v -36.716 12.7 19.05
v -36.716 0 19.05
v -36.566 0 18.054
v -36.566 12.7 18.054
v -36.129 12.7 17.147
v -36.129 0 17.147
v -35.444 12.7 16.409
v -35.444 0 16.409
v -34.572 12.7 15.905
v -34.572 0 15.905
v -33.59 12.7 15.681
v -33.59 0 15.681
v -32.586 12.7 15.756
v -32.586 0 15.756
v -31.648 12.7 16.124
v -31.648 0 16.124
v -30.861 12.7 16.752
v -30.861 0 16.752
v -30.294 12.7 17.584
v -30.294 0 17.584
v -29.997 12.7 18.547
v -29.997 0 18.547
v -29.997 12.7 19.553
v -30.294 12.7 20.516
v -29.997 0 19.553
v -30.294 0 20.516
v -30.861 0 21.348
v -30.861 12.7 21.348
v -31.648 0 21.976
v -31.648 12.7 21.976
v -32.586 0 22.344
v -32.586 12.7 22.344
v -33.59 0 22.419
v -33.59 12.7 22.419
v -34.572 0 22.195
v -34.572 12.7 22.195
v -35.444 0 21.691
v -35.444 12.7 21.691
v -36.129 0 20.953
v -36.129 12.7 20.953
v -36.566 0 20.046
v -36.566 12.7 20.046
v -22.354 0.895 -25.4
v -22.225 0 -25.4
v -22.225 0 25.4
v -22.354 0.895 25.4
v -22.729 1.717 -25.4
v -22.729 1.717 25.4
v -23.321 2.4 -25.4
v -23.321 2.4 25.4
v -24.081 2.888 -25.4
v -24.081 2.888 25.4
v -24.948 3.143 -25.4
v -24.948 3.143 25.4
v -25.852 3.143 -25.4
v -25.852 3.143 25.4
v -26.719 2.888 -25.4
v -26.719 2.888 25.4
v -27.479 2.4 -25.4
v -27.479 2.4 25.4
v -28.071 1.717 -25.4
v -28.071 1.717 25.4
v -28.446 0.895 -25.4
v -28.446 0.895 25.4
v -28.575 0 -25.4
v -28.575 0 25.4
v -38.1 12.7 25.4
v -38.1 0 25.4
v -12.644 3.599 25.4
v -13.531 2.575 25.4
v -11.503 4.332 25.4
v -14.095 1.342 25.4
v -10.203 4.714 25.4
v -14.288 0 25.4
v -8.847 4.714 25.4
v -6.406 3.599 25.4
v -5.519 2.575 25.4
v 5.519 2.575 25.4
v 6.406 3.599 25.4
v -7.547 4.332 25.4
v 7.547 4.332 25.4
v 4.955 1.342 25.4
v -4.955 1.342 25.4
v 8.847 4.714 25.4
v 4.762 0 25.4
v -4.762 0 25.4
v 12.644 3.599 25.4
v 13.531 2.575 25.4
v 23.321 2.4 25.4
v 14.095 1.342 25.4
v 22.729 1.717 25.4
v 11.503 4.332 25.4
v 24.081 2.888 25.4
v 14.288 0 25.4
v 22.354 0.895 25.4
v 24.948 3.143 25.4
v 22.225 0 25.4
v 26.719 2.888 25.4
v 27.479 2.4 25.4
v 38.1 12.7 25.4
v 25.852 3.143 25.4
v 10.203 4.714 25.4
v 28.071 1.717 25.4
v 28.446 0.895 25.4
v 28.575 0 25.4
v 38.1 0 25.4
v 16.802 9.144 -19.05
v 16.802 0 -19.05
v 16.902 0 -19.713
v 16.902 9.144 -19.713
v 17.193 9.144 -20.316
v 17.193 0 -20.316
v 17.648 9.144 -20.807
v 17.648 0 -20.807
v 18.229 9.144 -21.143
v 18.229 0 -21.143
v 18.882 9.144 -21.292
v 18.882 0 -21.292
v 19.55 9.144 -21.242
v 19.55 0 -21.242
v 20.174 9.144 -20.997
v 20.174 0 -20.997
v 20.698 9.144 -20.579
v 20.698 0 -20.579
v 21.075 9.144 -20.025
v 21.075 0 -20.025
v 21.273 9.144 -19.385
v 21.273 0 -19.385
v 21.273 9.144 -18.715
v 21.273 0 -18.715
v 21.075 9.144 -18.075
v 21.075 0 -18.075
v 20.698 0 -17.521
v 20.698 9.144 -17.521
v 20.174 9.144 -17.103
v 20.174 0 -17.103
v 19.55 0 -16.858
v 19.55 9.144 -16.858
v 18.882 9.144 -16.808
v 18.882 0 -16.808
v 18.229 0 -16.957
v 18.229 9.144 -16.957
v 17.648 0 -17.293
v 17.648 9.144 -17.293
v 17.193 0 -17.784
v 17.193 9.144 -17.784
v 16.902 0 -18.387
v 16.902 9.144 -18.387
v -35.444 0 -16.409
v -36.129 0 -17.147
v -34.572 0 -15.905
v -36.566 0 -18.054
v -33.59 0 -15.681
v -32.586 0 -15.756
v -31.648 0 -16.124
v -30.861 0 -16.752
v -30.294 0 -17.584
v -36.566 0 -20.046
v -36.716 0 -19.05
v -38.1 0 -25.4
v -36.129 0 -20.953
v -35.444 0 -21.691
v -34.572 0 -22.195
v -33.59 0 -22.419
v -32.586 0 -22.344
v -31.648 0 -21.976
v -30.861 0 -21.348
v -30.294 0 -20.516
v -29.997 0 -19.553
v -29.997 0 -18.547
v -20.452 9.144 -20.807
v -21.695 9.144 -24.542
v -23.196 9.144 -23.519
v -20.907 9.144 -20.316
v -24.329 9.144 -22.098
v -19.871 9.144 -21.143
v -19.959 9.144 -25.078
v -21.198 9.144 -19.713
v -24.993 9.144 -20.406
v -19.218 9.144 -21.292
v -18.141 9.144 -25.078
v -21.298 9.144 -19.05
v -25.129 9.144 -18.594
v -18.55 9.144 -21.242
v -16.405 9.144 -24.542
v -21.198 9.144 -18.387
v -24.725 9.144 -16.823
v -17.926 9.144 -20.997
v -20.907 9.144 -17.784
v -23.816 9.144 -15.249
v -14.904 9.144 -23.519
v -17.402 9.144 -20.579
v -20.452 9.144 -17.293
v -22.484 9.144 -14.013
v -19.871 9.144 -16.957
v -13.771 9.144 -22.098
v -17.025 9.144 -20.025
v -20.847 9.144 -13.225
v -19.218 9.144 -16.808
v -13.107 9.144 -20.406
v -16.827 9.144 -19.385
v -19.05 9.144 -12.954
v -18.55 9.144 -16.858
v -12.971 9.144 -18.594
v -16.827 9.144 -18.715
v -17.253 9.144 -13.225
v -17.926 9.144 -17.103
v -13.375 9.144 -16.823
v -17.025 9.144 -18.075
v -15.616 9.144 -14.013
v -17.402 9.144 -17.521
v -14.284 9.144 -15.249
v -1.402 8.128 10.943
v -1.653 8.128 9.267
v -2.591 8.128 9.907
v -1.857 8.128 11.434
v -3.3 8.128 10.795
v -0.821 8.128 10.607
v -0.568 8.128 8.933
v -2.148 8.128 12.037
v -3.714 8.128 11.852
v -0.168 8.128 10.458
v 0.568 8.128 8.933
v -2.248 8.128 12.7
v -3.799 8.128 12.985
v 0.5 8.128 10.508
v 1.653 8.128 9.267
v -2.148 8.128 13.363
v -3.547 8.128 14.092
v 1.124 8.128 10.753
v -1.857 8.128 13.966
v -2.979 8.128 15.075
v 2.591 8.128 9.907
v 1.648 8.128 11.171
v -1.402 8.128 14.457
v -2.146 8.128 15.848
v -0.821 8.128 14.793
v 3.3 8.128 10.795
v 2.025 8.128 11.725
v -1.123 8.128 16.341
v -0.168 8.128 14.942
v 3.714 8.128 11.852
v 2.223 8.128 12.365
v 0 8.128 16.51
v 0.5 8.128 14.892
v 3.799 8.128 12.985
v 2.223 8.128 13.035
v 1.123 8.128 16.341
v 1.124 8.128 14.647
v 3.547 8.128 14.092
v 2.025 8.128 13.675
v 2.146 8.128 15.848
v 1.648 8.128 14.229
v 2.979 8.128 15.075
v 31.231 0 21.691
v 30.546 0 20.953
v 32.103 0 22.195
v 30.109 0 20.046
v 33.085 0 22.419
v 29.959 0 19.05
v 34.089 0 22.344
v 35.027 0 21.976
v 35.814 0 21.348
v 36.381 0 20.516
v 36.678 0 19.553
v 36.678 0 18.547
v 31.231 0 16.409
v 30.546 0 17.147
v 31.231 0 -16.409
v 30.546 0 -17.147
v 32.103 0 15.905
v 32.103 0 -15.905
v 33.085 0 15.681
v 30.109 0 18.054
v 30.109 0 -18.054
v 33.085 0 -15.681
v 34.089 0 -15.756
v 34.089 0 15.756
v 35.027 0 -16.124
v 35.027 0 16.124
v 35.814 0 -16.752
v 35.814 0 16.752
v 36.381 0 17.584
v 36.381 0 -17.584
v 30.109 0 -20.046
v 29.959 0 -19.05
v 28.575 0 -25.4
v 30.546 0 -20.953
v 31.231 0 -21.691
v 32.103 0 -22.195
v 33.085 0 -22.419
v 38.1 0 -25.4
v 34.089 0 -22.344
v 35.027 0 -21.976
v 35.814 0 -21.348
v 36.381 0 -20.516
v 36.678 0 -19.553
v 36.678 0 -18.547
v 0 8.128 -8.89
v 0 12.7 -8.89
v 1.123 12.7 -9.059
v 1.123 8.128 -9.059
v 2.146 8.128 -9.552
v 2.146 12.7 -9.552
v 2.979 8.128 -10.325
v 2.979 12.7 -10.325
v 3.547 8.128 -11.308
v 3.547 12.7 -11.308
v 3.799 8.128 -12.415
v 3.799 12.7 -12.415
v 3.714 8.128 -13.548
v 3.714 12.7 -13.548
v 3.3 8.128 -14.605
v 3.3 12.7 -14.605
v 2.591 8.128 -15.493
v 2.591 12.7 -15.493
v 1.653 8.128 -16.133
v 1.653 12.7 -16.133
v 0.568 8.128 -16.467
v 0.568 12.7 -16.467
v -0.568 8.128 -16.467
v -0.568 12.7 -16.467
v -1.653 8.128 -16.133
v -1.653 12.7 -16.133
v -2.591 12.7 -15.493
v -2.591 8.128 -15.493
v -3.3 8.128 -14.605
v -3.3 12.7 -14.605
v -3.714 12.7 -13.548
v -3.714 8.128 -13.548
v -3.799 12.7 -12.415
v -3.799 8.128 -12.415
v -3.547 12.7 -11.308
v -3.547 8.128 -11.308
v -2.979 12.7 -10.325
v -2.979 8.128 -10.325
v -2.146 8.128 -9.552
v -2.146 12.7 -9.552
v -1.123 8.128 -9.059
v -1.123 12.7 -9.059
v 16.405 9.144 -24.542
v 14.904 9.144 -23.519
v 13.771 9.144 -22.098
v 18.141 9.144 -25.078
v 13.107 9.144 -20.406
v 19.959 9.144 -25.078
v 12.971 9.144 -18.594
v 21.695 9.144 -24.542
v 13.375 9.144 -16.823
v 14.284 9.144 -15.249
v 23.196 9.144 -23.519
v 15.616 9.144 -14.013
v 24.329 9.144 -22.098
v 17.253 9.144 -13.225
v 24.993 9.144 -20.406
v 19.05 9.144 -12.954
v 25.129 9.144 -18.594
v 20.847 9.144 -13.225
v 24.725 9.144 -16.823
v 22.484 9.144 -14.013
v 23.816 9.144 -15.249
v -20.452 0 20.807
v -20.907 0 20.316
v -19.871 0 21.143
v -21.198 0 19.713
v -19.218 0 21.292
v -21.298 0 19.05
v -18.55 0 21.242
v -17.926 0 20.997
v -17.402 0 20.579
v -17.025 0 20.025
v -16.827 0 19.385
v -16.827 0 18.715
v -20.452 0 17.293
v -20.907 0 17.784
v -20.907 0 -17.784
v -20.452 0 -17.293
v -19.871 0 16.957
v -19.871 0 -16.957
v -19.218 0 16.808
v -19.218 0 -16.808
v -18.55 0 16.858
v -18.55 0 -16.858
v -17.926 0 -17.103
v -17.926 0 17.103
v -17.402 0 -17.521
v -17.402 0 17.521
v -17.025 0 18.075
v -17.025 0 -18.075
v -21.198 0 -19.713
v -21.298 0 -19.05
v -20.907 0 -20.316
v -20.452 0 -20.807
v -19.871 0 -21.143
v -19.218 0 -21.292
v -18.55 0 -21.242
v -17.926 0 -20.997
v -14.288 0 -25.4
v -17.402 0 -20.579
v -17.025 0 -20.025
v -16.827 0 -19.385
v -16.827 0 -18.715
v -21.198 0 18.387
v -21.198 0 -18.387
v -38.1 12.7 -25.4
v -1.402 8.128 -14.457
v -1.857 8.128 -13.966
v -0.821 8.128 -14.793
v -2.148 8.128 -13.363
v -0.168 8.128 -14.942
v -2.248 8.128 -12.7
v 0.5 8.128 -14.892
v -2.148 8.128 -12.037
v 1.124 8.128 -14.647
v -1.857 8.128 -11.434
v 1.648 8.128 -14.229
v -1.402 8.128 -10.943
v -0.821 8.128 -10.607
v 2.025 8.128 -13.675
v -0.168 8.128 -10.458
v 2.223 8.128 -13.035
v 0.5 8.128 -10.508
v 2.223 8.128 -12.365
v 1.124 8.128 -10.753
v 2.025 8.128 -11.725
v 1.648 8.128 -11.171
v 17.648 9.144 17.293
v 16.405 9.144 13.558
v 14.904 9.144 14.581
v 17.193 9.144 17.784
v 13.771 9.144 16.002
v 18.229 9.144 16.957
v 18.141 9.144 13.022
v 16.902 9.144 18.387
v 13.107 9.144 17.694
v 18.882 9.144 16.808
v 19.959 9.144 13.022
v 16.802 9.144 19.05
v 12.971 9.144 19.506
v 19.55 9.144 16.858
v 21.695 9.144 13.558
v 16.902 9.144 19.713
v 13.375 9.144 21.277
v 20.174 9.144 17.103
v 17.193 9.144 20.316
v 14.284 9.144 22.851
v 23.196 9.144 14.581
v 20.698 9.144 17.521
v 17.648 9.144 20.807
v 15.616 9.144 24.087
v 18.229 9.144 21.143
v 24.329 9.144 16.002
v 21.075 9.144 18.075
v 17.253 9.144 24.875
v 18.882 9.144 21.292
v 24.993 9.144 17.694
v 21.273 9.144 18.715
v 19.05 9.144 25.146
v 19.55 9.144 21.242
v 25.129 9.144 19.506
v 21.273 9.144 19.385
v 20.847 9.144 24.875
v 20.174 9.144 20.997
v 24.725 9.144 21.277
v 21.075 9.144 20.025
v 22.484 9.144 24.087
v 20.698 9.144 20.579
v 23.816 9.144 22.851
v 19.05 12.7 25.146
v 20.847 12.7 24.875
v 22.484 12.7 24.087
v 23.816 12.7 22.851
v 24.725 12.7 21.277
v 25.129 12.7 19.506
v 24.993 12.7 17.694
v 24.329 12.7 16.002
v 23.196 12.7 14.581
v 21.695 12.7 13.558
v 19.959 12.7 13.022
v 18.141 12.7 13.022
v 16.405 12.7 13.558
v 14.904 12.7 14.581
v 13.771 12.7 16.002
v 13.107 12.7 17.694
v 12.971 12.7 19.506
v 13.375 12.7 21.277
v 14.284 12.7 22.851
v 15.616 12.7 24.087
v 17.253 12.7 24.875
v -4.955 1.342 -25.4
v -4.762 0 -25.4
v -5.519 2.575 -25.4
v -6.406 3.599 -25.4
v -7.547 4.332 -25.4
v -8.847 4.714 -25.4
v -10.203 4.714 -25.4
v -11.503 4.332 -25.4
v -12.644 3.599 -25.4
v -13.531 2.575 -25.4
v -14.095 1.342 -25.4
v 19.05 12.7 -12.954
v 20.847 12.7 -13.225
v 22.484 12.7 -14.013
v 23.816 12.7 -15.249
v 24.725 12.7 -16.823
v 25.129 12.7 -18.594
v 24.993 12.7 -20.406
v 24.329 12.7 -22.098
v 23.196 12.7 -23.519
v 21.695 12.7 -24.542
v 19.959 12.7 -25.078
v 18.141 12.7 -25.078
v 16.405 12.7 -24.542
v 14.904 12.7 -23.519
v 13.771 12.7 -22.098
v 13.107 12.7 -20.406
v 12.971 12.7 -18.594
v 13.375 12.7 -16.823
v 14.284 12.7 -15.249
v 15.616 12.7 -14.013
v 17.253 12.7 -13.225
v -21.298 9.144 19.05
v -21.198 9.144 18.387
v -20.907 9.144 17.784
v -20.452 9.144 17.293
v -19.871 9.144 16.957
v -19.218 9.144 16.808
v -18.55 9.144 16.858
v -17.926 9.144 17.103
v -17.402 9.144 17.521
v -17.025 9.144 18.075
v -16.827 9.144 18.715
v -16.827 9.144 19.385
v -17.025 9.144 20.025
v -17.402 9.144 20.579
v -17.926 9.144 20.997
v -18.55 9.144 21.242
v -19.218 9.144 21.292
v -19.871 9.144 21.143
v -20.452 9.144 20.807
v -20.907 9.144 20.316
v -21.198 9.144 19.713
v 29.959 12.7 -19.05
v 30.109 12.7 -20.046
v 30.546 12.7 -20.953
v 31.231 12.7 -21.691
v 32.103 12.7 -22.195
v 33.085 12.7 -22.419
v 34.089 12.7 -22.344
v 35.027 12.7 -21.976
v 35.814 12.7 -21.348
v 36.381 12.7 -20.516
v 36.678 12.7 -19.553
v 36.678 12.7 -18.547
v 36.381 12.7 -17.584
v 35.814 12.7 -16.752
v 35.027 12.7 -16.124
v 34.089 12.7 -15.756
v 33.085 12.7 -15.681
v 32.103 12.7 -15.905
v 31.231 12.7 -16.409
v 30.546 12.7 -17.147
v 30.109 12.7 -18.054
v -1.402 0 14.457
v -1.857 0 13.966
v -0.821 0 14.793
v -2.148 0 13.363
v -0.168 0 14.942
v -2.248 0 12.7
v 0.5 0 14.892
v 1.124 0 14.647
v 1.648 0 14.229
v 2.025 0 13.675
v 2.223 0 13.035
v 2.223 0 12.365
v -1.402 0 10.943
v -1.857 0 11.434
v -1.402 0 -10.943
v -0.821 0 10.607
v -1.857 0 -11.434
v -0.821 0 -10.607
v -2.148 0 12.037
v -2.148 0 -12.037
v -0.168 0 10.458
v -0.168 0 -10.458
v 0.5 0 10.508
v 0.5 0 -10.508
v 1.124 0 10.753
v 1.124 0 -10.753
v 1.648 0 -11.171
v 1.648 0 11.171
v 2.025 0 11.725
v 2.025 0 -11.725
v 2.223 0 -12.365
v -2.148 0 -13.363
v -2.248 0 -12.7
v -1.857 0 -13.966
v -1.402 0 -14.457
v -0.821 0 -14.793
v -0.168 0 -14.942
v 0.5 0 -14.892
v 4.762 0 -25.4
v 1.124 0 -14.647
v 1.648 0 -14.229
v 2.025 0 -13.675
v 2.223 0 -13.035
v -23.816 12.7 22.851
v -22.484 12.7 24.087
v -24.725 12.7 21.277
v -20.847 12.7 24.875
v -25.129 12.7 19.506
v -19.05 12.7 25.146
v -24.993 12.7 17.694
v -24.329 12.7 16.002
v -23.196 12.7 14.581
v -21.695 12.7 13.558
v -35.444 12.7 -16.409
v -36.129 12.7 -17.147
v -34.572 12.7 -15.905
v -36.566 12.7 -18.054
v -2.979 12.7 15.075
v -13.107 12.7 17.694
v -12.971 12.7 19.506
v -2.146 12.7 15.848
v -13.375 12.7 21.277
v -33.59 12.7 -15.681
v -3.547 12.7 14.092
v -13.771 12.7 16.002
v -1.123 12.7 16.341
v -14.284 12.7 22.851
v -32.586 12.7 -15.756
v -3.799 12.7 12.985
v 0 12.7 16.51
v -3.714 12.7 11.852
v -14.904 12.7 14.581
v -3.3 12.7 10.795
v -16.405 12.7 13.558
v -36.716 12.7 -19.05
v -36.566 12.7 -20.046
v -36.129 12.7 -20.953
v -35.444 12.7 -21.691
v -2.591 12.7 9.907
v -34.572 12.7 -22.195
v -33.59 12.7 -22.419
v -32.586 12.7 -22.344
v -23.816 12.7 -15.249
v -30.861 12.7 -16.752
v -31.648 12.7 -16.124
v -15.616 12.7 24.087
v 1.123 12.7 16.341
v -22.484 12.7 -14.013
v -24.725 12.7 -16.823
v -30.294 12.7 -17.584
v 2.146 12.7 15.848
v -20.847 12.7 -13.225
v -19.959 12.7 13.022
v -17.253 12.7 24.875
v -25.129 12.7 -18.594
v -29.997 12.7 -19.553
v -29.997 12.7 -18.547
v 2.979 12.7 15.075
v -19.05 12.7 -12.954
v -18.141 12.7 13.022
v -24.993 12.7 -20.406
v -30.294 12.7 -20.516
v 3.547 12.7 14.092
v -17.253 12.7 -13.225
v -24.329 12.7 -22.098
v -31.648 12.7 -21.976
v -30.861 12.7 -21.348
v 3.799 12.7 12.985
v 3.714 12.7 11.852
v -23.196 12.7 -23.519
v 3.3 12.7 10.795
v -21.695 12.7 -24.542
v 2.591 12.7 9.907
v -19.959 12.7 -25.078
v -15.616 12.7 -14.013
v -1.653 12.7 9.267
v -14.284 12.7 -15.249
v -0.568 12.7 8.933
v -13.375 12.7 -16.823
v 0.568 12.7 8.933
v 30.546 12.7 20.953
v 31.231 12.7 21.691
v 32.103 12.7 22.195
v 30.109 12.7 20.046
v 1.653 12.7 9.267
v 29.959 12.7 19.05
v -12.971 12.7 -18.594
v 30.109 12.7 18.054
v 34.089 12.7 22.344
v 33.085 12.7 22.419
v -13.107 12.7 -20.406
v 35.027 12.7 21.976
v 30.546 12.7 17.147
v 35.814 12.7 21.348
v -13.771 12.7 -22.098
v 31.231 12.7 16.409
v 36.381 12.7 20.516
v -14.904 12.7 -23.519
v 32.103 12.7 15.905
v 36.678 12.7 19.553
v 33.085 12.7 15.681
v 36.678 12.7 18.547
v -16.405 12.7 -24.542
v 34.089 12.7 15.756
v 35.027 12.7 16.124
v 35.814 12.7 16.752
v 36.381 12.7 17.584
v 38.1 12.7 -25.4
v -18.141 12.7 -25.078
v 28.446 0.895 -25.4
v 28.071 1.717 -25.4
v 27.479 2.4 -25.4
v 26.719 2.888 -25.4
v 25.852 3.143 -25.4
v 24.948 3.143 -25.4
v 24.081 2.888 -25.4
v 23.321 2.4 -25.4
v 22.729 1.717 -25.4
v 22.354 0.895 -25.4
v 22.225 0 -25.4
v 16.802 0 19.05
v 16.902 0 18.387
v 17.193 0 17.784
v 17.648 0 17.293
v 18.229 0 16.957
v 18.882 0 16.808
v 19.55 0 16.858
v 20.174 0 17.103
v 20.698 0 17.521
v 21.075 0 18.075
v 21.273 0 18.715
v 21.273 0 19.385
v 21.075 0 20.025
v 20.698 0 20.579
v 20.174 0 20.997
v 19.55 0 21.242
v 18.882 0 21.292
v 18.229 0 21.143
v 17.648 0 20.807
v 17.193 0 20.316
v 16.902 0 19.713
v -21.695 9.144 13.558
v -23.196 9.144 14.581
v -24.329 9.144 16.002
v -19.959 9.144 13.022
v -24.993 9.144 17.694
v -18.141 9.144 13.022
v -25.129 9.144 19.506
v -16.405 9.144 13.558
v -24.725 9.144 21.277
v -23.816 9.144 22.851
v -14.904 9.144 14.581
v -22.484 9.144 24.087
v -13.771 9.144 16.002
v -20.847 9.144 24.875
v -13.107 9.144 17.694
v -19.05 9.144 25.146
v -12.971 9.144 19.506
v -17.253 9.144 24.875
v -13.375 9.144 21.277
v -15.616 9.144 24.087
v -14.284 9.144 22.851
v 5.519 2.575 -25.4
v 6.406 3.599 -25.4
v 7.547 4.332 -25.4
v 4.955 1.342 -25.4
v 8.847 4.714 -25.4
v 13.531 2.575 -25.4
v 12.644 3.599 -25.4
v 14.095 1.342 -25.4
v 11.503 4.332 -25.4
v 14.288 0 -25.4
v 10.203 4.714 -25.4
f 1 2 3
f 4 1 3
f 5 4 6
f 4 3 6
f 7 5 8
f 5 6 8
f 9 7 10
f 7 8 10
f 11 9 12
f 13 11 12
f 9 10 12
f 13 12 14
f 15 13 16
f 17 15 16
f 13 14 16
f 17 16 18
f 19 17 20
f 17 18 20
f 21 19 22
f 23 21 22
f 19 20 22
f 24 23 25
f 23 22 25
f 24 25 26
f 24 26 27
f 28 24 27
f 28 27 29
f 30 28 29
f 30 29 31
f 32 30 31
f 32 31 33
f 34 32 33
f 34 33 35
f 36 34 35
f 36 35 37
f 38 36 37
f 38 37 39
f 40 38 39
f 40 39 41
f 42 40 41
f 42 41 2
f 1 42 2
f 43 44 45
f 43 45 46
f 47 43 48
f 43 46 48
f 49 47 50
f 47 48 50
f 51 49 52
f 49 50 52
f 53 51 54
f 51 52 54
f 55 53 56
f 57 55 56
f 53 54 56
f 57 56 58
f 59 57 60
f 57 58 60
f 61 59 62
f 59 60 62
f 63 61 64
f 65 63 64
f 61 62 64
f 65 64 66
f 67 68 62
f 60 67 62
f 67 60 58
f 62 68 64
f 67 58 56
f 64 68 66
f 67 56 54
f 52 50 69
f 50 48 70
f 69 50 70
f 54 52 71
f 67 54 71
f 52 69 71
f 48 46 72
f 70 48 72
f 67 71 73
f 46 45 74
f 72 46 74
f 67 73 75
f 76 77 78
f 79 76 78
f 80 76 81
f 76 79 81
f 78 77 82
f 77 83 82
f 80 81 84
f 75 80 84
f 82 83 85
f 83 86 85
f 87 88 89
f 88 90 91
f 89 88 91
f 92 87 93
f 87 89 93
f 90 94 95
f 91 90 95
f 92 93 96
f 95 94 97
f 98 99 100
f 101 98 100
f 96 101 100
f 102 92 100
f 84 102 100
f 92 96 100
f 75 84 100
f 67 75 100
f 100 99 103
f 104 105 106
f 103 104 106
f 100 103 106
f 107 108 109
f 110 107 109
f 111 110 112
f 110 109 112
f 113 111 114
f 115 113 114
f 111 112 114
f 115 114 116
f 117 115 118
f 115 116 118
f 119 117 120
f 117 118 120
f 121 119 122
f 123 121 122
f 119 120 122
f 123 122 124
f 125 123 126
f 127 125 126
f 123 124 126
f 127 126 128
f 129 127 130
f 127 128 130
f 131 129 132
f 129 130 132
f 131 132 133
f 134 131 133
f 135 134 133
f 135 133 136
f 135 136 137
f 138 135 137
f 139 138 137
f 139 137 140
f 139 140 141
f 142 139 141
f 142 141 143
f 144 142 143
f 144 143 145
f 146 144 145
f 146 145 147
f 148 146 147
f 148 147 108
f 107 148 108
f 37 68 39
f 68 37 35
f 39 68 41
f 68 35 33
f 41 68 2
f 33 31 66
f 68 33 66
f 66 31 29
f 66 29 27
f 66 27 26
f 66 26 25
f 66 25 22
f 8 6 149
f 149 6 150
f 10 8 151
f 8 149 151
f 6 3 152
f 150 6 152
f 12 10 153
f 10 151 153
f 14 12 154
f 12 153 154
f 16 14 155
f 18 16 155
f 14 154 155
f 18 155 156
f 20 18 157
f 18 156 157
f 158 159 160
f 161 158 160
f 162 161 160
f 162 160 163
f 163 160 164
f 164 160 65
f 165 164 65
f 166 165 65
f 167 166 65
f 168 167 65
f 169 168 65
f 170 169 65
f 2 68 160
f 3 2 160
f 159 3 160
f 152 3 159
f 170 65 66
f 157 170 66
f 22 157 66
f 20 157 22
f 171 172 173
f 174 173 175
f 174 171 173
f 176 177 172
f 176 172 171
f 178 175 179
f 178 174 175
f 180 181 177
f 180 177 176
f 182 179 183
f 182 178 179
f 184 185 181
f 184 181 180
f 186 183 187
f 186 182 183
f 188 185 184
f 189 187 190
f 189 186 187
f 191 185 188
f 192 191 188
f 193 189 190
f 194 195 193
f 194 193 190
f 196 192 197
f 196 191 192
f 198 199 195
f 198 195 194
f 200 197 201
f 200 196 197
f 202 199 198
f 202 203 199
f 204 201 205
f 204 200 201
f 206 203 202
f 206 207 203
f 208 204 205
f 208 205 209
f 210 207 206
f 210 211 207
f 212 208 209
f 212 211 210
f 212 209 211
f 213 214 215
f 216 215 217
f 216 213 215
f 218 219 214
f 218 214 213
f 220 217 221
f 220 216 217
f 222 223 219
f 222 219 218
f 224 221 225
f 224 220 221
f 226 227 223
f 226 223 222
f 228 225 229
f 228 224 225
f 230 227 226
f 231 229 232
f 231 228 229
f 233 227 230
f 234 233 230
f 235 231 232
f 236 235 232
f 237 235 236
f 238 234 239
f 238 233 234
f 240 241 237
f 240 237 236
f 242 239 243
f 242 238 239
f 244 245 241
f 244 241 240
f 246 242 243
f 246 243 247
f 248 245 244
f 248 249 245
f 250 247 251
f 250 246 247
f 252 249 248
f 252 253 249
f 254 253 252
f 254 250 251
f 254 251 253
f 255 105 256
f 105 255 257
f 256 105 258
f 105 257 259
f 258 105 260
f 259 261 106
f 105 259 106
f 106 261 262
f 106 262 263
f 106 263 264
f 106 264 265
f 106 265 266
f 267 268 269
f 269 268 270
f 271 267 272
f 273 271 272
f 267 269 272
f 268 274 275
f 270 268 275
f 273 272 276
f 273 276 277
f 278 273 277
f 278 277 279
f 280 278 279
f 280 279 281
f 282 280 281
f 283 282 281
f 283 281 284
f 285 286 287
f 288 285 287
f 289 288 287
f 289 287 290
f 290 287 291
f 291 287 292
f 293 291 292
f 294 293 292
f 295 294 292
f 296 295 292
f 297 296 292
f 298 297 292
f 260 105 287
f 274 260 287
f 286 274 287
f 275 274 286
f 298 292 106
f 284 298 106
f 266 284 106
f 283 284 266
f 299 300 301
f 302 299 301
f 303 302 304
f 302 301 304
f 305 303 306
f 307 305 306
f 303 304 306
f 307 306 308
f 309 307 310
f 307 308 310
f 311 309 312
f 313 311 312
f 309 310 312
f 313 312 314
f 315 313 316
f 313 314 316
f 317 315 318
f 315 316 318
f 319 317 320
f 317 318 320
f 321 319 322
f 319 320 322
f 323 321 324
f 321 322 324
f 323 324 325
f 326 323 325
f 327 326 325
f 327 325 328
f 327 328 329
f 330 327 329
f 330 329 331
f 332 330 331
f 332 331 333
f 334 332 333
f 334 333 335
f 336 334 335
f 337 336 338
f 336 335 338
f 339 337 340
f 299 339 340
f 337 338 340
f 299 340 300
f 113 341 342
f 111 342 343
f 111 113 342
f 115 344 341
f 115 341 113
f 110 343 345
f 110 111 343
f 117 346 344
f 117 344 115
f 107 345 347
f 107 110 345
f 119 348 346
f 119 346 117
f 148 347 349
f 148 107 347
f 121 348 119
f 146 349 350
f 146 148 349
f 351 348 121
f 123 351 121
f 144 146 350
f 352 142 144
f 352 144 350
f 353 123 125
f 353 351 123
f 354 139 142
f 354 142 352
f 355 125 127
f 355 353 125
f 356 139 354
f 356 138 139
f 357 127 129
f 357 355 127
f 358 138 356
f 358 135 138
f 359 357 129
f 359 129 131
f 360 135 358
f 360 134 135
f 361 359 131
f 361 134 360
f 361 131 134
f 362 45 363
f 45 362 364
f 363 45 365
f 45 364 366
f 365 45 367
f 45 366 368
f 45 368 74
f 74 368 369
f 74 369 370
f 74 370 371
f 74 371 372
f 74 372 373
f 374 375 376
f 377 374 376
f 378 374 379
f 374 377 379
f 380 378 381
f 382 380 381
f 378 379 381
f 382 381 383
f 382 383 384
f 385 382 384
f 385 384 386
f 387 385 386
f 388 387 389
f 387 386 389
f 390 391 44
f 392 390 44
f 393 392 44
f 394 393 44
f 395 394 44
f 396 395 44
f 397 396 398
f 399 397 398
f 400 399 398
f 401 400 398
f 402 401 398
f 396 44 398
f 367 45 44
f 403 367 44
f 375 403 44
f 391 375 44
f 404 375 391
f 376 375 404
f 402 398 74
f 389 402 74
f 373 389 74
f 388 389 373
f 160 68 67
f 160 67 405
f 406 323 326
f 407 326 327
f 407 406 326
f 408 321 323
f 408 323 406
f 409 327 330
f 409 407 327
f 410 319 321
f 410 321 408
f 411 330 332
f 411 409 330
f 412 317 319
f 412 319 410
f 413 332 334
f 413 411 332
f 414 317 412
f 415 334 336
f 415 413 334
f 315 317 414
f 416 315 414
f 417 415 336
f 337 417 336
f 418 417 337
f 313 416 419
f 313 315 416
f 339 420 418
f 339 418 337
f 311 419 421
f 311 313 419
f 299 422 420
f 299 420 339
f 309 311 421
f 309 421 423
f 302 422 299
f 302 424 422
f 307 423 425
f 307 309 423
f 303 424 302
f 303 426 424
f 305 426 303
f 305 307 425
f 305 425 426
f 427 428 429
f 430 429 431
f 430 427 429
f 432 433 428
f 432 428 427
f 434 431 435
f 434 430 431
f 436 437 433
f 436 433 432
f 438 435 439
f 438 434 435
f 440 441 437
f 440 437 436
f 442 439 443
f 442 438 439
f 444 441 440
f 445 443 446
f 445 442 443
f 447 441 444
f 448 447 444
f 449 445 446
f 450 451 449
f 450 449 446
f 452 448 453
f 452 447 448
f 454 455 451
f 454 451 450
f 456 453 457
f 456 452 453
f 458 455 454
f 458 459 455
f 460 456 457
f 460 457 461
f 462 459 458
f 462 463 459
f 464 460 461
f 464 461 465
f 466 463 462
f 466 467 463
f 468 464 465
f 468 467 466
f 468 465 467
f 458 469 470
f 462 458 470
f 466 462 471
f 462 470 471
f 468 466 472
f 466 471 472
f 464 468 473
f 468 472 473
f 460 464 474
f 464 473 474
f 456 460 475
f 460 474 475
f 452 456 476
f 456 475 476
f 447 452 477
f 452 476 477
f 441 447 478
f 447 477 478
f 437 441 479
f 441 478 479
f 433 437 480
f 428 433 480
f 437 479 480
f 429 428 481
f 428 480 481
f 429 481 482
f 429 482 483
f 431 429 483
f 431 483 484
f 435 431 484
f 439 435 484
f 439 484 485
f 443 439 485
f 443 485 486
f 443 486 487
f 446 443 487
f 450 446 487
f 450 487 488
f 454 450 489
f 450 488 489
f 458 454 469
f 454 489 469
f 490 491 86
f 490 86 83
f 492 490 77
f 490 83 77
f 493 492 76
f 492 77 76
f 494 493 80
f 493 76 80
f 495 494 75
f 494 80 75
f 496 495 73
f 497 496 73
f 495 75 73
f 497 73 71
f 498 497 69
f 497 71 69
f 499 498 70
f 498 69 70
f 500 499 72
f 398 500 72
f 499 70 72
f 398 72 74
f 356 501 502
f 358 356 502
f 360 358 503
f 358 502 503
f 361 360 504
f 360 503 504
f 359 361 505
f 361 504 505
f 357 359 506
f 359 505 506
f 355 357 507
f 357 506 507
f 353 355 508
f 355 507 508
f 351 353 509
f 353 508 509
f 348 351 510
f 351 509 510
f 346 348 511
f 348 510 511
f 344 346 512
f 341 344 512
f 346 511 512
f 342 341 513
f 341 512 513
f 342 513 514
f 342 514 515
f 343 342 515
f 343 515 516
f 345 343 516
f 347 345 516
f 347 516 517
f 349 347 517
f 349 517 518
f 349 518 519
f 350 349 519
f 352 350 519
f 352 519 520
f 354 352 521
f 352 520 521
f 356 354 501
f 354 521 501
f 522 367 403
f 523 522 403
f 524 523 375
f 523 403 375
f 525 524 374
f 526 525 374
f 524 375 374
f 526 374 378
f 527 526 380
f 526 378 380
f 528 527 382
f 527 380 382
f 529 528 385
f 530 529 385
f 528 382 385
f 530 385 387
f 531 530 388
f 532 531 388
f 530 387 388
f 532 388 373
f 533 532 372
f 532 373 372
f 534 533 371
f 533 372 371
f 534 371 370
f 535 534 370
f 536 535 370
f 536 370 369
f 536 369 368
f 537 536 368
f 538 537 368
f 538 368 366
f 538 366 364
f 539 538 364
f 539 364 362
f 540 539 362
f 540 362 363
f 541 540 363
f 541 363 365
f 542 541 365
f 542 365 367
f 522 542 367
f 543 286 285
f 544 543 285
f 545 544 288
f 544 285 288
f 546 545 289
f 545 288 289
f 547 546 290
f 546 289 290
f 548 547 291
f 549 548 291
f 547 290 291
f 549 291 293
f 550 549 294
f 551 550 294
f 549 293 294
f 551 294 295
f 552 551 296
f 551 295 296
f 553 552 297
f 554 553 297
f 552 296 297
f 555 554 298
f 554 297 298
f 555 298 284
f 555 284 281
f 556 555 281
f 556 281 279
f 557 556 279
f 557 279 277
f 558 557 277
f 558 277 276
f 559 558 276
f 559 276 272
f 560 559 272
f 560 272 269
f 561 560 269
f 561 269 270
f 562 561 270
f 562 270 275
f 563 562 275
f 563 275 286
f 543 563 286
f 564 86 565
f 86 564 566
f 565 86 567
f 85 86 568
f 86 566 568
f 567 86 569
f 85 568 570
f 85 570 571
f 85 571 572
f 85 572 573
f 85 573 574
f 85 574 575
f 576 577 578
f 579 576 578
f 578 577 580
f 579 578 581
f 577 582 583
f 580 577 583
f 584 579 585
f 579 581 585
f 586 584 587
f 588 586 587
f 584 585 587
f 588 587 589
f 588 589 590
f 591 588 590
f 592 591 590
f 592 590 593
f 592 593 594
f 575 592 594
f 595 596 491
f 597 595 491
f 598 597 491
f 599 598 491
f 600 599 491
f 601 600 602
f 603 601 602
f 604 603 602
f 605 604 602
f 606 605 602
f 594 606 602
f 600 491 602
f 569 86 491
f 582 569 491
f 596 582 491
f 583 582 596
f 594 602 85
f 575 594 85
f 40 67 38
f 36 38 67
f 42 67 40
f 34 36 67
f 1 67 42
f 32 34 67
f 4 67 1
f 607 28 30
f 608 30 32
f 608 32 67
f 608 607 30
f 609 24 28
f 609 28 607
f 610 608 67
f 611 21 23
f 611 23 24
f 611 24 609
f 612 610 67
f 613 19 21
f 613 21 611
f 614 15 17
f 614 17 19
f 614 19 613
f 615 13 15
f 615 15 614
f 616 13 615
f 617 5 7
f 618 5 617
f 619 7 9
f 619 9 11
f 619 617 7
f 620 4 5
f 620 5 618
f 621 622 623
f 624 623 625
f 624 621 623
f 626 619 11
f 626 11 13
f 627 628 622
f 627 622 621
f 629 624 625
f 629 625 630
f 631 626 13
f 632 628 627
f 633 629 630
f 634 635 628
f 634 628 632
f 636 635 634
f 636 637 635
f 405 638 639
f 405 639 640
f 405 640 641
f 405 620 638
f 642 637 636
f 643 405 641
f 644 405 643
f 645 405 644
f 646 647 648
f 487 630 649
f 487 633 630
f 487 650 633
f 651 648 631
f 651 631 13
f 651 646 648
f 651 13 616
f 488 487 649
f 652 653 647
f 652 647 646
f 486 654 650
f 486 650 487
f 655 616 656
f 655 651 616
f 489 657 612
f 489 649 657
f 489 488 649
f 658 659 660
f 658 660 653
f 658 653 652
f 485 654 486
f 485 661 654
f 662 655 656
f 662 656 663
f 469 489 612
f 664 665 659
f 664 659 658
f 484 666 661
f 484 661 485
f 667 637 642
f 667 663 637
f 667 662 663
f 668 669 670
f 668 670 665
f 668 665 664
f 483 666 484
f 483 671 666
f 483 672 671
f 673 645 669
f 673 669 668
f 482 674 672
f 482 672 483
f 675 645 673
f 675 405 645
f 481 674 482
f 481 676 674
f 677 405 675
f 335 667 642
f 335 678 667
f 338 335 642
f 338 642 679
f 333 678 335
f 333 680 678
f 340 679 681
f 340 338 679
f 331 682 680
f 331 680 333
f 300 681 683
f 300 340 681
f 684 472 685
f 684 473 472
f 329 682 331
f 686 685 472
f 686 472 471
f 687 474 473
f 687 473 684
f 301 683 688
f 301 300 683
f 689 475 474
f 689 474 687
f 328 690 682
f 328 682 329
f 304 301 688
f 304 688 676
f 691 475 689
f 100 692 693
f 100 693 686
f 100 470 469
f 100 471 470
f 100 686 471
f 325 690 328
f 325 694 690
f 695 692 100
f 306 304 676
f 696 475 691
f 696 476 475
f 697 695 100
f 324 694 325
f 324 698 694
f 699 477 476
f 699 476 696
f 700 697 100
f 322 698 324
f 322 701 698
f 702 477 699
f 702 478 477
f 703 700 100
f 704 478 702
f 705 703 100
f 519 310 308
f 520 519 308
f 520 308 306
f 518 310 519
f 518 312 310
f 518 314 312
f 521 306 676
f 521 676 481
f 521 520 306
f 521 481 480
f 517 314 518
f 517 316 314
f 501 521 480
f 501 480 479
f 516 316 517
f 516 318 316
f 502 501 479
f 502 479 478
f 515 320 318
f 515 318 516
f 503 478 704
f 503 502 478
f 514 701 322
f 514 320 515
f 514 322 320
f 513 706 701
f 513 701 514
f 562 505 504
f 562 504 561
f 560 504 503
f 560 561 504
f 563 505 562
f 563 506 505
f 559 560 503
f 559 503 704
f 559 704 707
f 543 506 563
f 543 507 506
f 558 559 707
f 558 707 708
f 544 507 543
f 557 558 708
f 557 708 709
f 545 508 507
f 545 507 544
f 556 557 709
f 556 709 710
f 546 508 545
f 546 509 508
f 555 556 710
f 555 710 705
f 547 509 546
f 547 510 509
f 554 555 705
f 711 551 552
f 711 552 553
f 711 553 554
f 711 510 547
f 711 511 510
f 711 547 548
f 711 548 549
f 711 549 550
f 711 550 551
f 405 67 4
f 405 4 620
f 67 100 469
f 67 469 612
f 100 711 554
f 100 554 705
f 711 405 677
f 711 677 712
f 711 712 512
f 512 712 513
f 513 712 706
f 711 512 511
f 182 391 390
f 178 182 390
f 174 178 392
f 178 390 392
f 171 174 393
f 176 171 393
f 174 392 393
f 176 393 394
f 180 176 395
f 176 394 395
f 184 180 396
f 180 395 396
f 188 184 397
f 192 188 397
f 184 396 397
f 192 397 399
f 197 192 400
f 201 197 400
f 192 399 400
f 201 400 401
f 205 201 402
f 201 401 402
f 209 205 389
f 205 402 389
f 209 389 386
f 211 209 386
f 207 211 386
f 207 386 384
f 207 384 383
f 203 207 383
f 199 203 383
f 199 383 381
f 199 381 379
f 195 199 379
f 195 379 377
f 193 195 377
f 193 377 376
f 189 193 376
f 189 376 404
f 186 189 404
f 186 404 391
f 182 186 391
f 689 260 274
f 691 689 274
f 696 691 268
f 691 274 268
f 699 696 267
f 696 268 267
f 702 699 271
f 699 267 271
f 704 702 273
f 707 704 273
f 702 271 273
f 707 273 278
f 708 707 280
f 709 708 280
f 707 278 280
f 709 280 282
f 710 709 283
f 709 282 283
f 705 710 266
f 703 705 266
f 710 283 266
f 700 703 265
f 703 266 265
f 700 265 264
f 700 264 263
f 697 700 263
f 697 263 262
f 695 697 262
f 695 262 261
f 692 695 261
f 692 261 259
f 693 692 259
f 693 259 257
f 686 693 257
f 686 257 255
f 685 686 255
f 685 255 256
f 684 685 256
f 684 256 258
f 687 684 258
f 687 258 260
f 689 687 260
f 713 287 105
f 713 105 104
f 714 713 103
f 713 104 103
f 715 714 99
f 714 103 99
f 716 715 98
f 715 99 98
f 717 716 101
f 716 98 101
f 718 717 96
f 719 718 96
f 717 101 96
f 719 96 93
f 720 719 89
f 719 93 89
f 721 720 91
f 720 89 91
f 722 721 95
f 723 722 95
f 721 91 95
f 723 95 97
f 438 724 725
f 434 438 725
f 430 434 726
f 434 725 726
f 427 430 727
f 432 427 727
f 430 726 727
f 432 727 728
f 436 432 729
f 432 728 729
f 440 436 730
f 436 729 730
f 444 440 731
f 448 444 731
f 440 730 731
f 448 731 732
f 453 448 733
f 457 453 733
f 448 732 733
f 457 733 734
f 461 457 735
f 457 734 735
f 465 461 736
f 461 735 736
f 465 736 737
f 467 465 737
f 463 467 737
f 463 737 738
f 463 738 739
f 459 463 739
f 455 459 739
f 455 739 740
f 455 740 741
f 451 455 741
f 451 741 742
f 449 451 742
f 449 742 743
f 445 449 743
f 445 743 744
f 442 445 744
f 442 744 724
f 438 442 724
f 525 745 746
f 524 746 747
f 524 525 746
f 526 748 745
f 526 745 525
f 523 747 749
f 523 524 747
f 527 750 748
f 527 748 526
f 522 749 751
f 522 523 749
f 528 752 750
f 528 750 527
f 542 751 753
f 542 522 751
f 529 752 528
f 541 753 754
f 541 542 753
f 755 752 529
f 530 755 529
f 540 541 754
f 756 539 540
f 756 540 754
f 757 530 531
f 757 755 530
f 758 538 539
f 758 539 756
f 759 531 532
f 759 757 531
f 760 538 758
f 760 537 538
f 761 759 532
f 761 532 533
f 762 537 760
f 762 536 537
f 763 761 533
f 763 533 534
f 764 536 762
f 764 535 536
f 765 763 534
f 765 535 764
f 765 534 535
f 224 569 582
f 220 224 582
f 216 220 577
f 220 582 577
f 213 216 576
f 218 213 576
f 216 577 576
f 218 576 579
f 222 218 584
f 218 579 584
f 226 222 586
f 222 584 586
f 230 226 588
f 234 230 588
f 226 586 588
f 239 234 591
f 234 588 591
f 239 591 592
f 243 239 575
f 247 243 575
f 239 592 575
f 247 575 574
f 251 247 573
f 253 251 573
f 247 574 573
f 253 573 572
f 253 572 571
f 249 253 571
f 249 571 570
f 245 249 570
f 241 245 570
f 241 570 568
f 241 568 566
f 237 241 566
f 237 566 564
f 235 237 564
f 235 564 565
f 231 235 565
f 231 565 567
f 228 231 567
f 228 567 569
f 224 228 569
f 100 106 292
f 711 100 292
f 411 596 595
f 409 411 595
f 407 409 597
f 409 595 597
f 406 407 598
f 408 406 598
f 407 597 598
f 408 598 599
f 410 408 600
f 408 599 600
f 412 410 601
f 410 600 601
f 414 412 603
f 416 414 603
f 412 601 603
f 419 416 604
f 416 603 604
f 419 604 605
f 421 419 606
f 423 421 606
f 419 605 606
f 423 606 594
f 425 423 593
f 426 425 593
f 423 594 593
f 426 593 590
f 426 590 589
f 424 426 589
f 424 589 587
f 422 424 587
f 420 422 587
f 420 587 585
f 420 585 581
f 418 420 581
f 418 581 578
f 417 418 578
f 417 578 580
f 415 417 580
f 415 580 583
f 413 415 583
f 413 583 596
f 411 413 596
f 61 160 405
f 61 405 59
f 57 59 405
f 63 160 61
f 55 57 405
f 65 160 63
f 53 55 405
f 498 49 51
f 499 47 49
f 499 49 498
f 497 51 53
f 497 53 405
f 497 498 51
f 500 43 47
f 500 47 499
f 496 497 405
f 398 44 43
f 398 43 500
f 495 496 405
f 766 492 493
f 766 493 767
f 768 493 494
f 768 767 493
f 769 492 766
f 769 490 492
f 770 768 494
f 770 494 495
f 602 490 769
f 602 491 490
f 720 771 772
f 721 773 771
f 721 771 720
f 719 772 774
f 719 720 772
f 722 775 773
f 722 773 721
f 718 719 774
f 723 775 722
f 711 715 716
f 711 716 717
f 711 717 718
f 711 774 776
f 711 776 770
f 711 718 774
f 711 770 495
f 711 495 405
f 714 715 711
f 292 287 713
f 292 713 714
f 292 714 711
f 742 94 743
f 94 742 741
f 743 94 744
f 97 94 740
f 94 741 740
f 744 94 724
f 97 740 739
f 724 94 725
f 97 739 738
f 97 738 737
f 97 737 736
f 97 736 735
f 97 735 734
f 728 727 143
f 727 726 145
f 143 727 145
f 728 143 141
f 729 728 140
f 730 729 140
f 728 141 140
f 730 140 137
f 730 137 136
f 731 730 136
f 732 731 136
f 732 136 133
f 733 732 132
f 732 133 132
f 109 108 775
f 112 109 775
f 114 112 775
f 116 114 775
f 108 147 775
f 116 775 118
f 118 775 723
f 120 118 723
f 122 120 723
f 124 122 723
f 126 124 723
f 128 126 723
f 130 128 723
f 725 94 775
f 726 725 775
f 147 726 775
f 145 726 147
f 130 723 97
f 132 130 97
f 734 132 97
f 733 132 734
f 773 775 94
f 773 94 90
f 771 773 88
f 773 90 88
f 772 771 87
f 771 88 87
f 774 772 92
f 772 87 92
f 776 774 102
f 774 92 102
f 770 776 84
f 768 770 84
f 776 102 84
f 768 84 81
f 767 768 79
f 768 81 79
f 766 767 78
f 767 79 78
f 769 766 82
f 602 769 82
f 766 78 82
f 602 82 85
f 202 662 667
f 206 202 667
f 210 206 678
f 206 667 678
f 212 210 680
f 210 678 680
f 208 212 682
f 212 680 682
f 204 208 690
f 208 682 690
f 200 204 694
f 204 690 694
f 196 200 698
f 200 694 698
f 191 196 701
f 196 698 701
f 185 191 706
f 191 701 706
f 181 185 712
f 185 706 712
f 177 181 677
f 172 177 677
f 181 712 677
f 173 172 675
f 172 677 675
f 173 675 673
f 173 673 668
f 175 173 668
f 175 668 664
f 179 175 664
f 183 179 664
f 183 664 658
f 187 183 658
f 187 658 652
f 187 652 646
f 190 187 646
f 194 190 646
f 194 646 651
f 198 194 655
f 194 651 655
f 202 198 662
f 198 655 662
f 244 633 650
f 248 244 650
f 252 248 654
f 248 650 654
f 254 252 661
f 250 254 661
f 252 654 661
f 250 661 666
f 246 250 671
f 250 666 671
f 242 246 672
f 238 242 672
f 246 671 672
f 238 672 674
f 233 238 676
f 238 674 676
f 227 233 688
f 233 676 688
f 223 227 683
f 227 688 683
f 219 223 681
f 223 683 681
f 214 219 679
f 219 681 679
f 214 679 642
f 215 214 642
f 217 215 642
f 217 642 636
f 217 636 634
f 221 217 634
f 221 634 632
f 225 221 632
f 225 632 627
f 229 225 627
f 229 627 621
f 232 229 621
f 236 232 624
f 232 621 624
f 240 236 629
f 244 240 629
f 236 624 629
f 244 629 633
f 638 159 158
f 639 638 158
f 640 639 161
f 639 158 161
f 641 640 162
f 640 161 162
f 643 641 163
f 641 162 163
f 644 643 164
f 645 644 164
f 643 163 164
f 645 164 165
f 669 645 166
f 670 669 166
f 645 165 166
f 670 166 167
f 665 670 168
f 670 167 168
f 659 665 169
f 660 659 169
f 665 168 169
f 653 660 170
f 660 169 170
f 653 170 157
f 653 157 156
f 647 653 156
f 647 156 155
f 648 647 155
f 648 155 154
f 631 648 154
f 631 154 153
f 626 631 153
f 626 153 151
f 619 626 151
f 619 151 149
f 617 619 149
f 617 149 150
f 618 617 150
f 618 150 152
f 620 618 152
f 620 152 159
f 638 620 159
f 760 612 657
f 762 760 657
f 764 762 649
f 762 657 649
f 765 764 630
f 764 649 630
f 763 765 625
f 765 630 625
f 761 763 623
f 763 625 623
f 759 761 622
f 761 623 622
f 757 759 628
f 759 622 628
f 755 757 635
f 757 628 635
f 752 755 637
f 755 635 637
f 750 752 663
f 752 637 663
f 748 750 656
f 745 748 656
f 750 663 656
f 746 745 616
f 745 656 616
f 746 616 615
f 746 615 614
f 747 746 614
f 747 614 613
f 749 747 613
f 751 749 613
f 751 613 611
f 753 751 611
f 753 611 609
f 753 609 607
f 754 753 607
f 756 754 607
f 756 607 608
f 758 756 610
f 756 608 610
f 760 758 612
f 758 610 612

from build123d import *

# Parameters (mm, degrees)
SKETCH1_W               = 76.2
SKETCH1_H               = 50.8
BOSS_EXTRUDE1_DEPTH     = 12.7
SKETCH2_R               = 3.175
CUT_EXTRUDE1_DEPTH      = 65.757547823
SKETCH3_R               = 4.7625
CUT_EXTRUDE2_DEPTH      = 65.757547823
F_1_4_CLEARANCE_HOLE1_D = 6.7564
F_8_CLEARANCE_HOLE1_D   = 4.4958
SKETCH10_R              = 3.81
CUT_EXTRUDE3_DEPTH      = 4.572
SKETCH11_R              = 6.096
CUT_EXTRUDE4_DEPTH      = 3.556


with BuildPart() as part:
    # Sketch1 → Boss-Extrude1 (new body)
    with BuildSketch(Plane(origin=(0, 0, 0), x_dir=(1, 0, 0), z_dir=(0, 1, 0))):
        Rectangle(SKETCH1_W, SKETCH1_H)
    extrude(amount=BOSS_EXTRUDE1_DEPTH)

    # Sketch2 → Cut-Extrude1 (cut, through all)
    with BuildSketch(Plane.XY.offset(25.4)):
        with Locations((-25.4, 0)):
            Circle(SKETCH2_R)
        with Locations((25.4, 0)):
            Circle(SKETCH2_R)
    extrude(amount=-CUT_EXTRUDE1_DEPTH, mode=Mode.SUBTRACT)

    # Sketch3 → Cut-Extrude2 (cut, through all)
    with BuildSketch(Plane.XY.offset(25.4)):
        with Locations((-9.525, 0)):
            Circle(SKETCH3_R)
        with Locations((9.525, 0)):
            Circle(SKETCH3_R)
    extrude(amount=-CUT_EXTRUDE2_DEPTH, mode=Mode.SUBTRACT)

    # 1/4 Clearance Hole1 (through all)
    with Locations(Plane(origin=(0, 12.7, 0), x_dir=(1, 0, 0), z_dir=(0, 1, 0))):
        with Locations((-33.3375, -19.05), (-33.3375, 19.05), (33.3375, 19.05), (33.3375, -19.05)):
            Hole(F_1_4_CLEARANCE_HOLE1_D / 2)

    # #8 Clearance Hole1 (through all)
    with Locations(Plane(origin=(0, 12.7, 0), x_dir=(1, 0, 0), z_dir=(0, 1, 0))):
        with Locations((-19.05, 19.05), (-19.05, -19.05), (19.05, -19.05), (19.05, 19.05), (0, 12.7), (0, -12.7)):
            Hole(F_8_CLEARANCE_HOLE1_D / 2)

    # Sketch10 → Cut-Extrude3 (cut)
    with BuildSketch(Plane(origin=(0, 12.7, 0), x_dir=(1, 0, 0), z_dir=(0, 1, 0))):
        with Locations(Location((0, 12.7, 0), (0, 0, 270))):
            Circle(SKETCH10_R)
        with Locations(Location((0, -12.7, 0), (0, 0, 270))):
            Circle(SKETCH10_R)
    extrude(amount=-CUT_EXTRUDE3_DEPTH, mode=Mode.SUBTRACT)

    # Sketch11 → Cut-Extrude4 (cut)
    with BuildSketch(Plane(origin=(0, 12.7, 0), x_dir=(1, 0, 0), z_dir=(0, 1, 0))):
        with Locations(Location((-19.05, 19.05, 0), (0, 0, 270))):
            Circle(SKETCH11_R)
        with Locations(Location((-19.05, -19.05, 0), (0, 0, 270))):
            Circle(SKETCH11_R)
        with Locations(Location((19.05, -19.05, 0), (0, 0, 270))):
            Circle(SKETCH11_R)
        with Locations(Location((19.05, 19.05, 0), (0, 0, 270))):
            Circle(SKETCH11_R)
    extrude(amount=-CUT_EXTRUDE4_DEPTH, mode=Mode.SUBTRACT)


solid = part.part
